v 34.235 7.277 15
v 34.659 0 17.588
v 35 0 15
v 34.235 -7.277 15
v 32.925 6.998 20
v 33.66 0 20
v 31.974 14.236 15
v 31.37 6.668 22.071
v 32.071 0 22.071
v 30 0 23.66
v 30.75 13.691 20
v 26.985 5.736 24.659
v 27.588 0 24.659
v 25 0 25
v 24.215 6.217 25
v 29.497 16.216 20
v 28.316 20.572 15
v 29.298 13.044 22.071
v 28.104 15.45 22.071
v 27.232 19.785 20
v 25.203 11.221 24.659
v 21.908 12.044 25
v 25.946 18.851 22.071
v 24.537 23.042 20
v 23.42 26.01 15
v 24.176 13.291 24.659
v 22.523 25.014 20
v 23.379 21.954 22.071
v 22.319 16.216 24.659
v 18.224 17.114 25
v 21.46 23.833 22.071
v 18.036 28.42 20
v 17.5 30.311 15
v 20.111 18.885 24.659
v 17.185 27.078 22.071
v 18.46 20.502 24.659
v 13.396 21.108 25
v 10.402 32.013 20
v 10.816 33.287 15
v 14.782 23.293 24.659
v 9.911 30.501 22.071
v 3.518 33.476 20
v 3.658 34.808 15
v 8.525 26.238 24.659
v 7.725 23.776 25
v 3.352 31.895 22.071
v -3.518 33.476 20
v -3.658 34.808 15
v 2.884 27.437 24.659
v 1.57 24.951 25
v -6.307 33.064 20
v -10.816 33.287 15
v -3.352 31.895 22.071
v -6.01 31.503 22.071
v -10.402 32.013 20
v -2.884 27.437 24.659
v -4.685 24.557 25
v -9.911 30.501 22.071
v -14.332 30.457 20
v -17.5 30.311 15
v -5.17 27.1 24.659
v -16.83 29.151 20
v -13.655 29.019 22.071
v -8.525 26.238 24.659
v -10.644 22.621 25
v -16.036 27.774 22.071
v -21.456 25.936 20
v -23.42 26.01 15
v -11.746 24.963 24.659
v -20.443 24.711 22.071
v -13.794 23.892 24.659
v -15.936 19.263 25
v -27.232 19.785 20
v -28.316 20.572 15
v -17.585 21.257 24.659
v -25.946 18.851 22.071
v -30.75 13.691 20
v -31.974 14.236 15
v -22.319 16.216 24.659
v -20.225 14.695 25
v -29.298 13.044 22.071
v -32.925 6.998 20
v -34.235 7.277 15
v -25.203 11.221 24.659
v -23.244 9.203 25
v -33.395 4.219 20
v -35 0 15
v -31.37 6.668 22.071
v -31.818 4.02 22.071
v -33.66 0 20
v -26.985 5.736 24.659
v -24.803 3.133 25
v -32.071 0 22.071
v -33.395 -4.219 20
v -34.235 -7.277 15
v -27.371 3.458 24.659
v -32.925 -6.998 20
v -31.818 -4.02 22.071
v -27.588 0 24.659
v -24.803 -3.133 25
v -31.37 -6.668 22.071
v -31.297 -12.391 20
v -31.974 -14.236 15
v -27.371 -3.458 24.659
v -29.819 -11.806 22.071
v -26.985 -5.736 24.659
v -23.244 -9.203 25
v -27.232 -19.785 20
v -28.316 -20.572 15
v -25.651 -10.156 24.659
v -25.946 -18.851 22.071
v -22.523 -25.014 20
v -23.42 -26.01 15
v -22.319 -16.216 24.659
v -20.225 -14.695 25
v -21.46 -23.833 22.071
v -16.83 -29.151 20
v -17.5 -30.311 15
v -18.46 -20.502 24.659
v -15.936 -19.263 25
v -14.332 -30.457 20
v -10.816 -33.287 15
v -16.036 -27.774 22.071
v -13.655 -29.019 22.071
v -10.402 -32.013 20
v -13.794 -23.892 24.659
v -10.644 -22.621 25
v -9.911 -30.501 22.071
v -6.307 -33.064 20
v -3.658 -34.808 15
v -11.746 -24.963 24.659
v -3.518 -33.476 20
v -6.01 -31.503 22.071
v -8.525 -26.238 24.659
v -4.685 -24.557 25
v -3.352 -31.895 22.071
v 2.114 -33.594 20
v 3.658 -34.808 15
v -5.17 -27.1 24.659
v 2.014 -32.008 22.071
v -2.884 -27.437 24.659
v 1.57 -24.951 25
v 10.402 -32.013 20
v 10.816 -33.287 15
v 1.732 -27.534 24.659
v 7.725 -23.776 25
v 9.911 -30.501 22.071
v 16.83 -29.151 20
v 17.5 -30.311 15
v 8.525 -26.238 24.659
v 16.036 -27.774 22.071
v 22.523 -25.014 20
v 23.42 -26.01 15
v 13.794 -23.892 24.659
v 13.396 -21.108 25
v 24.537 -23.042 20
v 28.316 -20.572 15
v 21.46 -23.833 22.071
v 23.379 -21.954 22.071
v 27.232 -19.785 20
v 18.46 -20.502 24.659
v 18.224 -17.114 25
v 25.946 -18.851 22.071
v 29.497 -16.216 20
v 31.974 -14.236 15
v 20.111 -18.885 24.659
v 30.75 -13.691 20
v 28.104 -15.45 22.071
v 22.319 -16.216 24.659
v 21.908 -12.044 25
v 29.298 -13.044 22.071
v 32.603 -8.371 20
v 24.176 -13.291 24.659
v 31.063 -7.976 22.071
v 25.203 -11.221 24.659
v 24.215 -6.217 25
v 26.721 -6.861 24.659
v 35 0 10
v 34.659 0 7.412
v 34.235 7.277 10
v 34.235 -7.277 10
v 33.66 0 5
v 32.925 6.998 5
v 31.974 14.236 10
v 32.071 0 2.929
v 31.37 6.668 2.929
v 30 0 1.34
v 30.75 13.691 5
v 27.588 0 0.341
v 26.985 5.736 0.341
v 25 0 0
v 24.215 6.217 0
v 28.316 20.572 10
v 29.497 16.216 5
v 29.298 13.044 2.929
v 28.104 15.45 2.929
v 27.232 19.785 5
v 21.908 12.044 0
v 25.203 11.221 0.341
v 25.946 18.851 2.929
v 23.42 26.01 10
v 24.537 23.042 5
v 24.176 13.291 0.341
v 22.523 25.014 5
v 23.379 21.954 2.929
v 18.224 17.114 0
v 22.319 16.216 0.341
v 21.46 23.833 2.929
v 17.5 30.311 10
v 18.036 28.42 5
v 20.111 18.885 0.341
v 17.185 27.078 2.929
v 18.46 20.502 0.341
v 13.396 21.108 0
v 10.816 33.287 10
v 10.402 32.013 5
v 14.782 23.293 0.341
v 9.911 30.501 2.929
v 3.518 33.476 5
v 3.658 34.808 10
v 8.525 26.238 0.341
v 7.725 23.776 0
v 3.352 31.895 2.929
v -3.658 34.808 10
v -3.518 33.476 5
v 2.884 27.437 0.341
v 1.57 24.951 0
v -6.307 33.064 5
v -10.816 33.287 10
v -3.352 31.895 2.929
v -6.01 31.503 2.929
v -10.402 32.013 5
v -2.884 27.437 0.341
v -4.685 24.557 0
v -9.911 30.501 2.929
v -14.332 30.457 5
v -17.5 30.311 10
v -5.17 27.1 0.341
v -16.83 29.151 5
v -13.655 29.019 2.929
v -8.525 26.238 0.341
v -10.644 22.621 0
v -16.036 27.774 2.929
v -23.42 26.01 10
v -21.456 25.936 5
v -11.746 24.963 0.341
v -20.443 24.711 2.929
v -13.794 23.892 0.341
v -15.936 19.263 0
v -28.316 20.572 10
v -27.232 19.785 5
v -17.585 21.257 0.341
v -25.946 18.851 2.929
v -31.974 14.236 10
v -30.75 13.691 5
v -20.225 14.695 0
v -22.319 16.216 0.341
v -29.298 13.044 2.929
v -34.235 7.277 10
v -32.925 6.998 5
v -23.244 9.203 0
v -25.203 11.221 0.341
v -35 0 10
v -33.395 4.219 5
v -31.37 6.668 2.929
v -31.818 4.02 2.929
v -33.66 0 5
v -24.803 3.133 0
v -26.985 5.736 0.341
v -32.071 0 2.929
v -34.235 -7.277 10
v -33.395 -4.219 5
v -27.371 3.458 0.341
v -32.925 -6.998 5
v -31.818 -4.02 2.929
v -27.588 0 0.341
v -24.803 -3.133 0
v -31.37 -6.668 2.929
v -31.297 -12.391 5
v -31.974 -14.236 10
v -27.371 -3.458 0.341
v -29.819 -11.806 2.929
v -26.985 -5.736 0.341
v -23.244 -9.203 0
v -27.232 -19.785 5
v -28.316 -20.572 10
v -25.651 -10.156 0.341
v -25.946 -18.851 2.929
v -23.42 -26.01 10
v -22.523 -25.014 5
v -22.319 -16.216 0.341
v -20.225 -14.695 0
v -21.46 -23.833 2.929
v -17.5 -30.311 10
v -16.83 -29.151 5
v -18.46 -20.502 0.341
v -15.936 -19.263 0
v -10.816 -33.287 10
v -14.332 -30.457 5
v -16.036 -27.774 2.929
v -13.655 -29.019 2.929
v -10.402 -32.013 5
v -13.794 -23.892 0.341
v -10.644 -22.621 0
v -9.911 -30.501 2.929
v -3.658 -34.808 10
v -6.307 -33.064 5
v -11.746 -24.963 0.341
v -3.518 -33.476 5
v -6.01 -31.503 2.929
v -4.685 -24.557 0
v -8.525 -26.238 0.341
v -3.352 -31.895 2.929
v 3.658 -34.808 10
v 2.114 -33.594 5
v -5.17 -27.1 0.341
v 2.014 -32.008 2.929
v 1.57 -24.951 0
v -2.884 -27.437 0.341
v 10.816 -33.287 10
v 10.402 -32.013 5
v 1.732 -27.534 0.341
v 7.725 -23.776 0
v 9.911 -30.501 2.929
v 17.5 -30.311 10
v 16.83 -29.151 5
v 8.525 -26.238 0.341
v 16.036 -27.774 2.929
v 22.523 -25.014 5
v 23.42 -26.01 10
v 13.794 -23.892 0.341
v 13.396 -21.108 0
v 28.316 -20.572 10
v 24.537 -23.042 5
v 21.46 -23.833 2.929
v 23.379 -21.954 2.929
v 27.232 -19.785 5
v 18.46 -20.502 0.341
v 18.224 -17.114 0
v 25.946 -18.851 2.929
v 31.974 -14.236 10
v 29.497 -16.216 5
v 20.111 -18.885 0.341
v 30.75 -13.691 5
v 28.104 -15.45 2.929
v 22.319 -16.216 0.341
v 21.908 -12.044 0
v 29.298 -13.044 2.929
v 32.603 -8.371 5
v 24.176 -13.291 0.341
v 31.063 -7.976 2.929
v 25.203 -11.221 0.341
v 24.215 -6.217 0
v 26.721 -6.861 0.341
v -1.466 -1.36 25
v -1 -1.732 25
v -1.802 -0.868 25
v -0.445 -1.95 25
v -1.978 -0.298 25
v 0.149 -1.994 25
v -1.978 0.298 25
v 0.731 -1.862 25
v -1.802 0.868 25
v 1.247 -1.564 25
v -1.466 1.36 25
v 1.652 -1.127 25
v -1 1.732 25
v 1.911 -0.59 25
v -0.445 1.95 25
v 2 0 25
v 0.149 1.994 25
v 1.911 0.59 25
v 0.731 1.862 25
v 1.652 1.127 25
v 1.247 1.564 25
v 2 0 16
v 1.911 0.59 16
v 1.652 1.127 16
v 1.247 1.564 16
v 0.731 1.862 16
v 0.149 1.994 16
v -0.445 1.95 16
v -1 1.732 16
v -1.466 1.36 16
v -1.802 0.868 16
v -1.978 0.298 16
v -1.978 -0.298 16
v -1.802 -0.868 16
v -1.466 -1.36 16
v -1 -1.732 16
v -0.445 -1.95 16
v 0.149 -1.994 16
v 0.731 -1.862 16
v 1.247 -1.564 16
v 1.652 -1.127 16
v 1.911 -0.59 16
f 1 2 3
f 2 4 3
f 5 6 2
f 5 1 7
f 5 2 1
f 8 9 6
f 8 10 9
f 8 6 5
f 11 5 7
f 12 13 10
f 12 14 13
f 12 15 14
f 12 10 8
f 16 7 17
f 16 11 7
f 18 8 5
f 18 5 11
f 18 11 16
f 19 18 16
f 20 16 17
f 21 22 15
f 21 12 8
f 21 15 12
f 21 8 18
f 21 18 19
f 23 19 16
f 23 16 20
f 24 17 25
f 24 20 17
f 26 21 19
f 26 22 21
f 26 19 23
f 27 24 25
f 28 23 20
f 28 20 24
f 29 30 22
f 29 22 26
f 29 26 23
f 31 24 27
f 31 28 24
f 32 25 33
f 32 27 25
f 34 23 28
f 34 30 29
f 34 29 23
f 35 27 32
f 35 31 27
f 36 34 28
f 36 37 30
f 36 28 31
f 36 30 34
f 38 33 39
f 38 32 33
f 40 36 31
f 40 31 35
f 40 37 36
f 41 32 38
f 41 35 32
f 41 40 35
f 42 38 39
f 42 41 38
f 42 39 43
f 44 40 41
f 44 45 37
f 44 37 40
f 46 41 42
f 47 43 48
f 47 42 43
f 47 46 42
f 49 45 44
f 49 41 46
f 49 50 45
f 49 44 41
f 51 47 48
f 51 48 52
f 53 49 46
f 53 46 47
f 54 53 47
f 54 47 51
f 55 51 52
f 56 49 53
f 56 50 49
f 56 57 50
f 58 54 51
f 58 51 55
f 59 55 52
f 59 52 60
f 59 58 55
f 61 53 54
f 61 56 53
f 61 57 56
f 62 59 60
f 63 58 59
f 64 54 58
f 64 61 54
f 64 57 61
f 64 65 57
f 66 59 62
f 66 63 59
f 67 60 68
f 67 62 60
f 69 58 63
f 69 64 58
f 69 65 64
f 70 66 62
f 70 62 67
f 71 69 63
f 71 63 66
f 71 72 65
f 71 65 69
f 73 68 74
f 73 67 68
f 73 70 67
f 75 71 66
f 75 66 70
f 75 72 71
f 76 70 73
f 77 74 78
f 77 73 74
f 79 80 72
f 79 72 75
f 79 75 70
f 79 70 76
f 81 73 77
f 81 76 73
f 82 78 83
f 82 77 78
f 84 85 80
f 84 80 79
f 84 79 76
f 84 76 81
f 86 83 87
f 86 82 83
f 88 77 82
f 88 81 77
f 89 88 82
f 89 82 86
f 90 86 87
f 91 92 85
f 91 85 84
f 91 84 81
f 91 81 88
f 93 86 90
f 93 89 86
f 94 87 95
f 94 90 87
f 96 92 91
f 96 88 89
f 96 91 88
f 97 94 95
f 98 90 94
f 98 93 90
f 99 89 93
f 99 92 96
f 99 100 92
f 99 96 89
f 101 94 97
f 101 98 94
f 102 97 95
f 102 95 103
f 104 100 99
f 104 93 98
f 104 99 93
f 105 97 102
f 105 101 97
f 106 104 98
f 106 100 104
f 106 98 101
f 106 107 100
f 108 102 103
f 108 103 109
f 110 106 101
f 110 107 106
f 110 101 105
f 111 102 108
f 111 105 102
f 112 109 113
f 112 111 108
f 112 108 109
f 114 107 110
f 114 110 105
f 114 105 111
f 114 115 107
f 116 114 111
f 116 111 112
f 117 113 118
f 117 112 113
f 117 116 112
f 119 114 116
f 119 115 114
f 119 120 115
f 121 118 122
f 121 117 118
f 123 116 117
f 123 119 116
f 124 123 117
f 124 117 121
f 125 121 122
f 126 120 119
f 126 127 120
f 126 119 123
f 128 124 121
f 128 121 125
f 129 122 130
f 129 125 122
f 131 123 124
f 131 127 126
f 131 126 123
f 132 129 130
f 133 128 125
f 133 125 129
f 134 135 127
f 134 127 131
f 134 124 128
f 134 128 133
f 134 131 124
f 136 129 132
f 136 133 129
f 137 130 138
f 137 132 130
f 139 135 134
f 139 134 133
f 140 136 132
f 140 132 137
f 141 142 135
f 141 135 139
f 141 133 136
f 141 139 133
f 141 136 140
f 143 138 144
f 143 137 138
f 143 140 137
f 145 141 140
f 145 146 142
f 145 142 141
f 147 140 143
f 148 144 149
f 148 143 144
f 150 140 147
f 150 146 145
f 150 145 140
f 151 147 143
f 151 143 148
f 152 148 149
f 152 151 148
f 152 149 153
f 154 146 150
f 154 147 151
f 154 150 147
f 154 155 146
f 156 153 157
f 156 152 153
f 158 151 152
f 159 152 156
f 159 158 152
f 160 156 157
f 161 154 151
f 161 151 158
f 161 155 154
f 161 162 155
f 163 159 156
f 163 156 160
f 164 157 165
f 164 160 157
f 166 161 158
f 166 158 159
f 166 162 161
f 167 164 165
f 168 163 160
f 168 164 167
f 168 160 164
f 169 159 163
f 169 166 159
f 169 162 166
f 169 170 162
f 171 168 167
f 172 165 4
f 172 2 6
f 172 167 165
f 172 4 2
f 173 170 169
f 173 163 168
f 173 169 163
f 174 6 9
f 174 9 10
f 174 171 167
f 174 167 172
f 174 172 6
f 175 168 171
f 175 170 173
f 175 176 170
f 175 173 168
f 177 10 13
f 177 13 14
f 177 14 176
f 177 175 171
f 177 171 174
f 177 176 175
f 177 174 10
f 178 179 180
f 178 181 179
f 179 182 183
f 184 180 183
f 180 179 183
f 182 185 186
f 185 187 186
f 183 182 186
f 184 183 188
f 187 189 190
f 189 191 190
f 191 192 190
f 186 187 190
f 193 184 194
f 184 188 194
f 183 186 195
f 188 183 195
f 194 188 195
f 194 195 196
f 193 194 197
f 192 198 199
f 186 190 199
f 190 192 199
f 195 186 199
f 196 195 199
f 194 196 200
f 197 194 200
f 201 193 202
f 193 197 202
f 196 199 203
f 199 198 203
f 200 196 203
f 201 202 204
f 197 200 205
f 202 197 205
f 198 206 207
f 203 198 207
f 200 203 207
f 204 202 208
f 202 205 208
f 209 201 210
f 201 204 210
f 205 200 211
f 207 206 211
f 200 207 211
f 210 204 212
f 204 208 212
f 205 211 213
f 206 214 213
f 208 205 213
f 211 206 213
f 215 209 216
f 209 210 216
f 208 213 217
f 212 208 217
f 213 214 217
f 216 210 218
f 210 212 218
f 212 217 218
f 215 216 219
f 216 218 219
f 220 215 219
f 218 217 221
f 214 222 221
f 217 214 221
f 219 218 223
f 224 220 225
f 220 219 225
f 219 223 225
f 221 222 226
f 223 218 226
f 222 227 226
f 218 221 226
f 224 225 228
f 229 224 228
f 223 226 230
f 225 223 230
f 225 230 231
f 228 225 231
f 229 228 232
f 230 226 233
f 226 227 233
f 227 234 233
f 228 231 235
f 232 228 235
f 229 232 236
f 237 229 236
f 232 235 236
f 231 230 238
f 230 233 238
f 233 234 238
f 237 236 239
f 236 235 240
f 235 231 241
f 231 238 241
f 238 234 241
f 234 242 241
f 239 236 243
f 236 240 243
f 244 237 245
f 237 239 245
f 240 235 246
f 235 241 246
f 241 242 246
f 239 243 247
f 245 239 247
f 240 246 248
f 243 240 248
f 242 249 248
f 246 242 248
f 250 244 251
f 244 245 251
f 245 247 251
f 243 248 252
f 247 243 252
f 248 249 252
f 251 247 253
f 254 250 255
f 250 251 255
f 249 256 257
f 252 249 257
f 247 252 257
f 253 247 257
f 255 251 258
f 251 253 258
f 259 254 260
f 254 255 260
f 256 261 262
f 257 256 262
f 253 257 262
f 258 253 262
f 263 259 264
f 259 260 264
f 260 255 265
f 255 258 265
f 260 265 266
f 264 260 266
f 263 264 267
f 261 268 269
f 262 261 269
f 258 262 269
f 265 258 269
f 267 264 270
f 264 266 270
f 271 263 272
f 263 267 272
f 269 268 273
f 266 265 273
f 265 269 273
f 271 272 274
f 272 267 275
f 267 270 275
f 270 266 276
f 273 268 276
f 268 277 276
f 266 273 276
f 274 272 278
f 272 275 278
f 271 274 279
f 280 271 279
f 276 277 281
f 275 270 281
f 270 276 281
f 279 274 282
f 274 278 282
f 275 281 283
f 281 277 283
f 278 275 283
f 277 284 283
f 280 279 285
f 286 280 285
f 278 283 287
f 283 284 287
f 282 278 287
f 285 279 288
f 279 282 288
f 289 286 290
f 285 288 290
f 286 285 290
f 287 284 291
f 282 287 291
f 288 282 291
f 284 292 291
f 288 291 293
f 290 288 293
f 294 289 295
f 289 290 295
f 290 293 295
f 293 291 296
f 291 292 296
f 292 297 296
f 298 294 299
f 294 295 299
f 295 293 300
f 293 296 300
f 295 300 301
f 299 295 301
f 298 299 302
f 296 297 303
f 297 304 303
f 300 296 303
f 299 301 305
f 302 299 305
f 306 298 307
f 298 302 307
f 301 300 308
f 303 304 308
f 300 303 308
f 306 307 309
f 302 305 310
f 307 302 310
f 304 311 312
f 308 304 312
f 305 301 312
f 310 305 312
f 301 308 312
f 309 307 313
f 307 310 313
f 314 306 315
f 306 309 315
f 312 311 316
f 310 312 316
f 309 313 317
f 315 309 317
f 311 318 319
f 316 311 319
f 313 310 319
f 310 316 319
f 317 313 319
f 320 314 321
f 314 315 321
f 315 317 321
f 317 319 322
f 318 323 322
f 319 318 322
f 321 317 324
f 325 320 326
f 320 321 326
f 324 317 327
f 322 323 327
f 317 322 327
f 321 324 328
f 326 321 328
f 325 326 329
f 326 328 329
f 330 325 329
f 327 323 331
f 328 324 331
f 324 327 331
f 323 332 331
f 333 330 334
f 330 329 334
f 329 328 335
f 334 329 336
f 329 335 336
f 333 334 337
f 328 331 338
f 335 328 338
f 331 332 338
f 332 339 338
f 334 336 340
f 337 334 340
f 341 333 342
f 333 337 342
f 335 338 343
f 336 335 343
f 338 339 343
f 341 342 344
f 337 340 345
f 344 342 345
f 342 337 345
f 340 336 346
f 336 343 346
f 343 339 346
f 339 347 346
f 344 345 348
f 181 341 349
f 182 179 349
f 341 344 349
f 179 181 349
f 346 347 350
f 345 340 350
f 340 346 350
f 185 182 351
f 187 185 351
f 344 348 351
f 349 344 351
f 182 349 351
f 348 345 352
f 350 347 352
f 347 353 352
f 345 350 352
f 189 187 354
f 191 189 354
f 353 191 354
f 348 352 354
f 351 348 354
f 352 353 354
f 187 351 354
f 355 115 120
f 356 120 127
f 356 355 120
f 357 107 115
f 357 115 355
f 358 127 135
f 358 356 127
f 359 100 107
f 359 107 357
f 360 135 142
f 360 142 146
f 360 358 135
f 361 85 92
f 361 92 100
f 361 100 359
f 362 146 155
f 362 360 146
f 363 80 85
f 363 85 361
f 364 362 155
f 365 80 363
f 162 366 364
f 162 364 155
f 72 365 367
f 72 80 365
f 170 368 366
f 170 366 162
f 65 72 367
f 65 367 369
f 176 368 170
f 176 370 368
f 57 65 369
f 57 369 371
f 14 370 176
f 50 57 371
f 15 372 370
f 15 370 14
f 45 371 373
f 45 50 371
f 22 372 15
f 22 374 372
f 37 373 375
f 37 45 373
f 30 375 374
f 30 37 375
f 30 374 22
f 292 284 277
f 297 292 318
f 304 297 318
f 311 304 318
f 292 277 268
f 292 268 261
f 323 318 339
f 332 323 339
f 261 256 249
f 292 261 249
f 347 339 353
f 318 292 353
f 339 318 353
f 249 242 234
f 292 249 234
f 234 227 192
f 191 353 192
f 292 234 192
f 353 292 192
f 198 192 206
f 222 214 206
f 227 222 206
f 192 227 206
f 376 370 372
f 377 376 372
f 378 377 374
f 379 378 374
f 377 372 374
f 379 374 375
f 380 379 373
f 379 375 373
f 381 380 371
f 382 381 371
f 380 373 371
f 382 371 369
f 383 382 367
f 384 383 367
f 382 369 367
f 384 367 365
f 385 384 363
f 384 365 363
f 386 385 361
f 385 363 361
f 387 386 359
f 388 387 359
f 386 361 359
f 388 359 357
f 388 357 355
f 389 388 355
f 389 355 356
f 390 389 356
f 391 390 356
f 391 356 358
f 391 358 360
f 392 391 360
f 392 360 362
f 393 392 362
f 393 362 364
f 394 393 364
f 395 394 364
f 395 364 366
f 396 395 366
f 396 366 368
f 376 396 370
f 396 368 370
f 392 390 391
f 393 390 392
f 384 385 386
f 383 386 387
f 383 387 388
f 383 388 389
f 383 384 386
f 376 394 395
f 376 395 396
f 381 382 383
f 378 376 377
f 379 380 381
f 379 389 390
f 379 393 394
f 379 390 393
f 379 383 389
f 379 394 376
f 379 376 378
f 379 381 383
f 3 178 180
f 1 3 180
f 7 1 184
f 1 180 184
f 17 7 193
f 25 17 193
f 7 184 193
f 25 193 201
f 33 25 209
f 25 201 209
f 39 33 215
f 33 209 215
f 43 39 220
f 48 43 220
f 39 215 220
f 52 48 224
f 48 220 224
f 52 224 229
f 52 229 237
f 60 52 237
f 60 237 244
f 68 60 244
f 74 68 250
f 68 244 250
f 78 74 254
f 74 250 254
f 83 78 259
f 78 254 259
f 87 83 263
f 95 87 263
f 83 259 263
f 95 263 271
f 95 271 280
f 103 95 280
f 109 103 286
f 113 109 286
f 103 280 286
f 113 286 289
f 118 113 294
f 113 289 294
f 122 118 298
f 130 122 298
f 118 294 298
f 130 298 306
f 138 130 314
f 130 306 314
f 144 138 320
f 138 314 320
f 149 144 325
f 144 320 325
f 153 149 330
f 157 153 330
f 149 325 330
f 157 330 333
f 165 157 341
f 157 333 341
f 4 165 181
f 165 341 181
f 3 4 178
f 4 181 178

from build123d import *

# Parameters (mm, degrees)
IZIM1_R                     = 35
Y_KSEKLIK_EKSTR_ZYON1_DEPTH = 25
IZIM2_R                     = 2
KES_EKSTR_ZYON1_DEPTH       = 9
RADYUS1_R                   = 10
RADYUS2_R                   = 10


with BuildPart() as part:
    # Çizim1 → Yükseklik-Ekstrüzyon1 (new body)
    with BuildSketch(Plane.XY):
        Circle(IZIM1_R)
    extrude(amount=Y_KSEKLIK_EKSTR_ZYON1_DEPTH)

    # Çizim2 → Kes-Ekstrüzyon1 (cut)
    with BuildSketch(Plane.XY.offset(25)):
        Circle(IZIM2_R)
    extrude(amount=-KES_EKSTR_ZYON1_DEPTH, mode=Mode.SUBTRACT)

    # Radyus1
    radyus1_edges = [part.edges().sort_by_distance(p)[0] for p in [
        (-35, 0, 0),
    ]]
    fillet(radyus1_edges, radius=RADYUS1_R)

    # Radyus2
    radyus2_edges = [part.edges().sort_by_distance(p)[0] for p in [
        (-35, 0, 25),
    ]]
    fillet(radyus2_edges, radius=RADYUS2_R)


solid = part.part
